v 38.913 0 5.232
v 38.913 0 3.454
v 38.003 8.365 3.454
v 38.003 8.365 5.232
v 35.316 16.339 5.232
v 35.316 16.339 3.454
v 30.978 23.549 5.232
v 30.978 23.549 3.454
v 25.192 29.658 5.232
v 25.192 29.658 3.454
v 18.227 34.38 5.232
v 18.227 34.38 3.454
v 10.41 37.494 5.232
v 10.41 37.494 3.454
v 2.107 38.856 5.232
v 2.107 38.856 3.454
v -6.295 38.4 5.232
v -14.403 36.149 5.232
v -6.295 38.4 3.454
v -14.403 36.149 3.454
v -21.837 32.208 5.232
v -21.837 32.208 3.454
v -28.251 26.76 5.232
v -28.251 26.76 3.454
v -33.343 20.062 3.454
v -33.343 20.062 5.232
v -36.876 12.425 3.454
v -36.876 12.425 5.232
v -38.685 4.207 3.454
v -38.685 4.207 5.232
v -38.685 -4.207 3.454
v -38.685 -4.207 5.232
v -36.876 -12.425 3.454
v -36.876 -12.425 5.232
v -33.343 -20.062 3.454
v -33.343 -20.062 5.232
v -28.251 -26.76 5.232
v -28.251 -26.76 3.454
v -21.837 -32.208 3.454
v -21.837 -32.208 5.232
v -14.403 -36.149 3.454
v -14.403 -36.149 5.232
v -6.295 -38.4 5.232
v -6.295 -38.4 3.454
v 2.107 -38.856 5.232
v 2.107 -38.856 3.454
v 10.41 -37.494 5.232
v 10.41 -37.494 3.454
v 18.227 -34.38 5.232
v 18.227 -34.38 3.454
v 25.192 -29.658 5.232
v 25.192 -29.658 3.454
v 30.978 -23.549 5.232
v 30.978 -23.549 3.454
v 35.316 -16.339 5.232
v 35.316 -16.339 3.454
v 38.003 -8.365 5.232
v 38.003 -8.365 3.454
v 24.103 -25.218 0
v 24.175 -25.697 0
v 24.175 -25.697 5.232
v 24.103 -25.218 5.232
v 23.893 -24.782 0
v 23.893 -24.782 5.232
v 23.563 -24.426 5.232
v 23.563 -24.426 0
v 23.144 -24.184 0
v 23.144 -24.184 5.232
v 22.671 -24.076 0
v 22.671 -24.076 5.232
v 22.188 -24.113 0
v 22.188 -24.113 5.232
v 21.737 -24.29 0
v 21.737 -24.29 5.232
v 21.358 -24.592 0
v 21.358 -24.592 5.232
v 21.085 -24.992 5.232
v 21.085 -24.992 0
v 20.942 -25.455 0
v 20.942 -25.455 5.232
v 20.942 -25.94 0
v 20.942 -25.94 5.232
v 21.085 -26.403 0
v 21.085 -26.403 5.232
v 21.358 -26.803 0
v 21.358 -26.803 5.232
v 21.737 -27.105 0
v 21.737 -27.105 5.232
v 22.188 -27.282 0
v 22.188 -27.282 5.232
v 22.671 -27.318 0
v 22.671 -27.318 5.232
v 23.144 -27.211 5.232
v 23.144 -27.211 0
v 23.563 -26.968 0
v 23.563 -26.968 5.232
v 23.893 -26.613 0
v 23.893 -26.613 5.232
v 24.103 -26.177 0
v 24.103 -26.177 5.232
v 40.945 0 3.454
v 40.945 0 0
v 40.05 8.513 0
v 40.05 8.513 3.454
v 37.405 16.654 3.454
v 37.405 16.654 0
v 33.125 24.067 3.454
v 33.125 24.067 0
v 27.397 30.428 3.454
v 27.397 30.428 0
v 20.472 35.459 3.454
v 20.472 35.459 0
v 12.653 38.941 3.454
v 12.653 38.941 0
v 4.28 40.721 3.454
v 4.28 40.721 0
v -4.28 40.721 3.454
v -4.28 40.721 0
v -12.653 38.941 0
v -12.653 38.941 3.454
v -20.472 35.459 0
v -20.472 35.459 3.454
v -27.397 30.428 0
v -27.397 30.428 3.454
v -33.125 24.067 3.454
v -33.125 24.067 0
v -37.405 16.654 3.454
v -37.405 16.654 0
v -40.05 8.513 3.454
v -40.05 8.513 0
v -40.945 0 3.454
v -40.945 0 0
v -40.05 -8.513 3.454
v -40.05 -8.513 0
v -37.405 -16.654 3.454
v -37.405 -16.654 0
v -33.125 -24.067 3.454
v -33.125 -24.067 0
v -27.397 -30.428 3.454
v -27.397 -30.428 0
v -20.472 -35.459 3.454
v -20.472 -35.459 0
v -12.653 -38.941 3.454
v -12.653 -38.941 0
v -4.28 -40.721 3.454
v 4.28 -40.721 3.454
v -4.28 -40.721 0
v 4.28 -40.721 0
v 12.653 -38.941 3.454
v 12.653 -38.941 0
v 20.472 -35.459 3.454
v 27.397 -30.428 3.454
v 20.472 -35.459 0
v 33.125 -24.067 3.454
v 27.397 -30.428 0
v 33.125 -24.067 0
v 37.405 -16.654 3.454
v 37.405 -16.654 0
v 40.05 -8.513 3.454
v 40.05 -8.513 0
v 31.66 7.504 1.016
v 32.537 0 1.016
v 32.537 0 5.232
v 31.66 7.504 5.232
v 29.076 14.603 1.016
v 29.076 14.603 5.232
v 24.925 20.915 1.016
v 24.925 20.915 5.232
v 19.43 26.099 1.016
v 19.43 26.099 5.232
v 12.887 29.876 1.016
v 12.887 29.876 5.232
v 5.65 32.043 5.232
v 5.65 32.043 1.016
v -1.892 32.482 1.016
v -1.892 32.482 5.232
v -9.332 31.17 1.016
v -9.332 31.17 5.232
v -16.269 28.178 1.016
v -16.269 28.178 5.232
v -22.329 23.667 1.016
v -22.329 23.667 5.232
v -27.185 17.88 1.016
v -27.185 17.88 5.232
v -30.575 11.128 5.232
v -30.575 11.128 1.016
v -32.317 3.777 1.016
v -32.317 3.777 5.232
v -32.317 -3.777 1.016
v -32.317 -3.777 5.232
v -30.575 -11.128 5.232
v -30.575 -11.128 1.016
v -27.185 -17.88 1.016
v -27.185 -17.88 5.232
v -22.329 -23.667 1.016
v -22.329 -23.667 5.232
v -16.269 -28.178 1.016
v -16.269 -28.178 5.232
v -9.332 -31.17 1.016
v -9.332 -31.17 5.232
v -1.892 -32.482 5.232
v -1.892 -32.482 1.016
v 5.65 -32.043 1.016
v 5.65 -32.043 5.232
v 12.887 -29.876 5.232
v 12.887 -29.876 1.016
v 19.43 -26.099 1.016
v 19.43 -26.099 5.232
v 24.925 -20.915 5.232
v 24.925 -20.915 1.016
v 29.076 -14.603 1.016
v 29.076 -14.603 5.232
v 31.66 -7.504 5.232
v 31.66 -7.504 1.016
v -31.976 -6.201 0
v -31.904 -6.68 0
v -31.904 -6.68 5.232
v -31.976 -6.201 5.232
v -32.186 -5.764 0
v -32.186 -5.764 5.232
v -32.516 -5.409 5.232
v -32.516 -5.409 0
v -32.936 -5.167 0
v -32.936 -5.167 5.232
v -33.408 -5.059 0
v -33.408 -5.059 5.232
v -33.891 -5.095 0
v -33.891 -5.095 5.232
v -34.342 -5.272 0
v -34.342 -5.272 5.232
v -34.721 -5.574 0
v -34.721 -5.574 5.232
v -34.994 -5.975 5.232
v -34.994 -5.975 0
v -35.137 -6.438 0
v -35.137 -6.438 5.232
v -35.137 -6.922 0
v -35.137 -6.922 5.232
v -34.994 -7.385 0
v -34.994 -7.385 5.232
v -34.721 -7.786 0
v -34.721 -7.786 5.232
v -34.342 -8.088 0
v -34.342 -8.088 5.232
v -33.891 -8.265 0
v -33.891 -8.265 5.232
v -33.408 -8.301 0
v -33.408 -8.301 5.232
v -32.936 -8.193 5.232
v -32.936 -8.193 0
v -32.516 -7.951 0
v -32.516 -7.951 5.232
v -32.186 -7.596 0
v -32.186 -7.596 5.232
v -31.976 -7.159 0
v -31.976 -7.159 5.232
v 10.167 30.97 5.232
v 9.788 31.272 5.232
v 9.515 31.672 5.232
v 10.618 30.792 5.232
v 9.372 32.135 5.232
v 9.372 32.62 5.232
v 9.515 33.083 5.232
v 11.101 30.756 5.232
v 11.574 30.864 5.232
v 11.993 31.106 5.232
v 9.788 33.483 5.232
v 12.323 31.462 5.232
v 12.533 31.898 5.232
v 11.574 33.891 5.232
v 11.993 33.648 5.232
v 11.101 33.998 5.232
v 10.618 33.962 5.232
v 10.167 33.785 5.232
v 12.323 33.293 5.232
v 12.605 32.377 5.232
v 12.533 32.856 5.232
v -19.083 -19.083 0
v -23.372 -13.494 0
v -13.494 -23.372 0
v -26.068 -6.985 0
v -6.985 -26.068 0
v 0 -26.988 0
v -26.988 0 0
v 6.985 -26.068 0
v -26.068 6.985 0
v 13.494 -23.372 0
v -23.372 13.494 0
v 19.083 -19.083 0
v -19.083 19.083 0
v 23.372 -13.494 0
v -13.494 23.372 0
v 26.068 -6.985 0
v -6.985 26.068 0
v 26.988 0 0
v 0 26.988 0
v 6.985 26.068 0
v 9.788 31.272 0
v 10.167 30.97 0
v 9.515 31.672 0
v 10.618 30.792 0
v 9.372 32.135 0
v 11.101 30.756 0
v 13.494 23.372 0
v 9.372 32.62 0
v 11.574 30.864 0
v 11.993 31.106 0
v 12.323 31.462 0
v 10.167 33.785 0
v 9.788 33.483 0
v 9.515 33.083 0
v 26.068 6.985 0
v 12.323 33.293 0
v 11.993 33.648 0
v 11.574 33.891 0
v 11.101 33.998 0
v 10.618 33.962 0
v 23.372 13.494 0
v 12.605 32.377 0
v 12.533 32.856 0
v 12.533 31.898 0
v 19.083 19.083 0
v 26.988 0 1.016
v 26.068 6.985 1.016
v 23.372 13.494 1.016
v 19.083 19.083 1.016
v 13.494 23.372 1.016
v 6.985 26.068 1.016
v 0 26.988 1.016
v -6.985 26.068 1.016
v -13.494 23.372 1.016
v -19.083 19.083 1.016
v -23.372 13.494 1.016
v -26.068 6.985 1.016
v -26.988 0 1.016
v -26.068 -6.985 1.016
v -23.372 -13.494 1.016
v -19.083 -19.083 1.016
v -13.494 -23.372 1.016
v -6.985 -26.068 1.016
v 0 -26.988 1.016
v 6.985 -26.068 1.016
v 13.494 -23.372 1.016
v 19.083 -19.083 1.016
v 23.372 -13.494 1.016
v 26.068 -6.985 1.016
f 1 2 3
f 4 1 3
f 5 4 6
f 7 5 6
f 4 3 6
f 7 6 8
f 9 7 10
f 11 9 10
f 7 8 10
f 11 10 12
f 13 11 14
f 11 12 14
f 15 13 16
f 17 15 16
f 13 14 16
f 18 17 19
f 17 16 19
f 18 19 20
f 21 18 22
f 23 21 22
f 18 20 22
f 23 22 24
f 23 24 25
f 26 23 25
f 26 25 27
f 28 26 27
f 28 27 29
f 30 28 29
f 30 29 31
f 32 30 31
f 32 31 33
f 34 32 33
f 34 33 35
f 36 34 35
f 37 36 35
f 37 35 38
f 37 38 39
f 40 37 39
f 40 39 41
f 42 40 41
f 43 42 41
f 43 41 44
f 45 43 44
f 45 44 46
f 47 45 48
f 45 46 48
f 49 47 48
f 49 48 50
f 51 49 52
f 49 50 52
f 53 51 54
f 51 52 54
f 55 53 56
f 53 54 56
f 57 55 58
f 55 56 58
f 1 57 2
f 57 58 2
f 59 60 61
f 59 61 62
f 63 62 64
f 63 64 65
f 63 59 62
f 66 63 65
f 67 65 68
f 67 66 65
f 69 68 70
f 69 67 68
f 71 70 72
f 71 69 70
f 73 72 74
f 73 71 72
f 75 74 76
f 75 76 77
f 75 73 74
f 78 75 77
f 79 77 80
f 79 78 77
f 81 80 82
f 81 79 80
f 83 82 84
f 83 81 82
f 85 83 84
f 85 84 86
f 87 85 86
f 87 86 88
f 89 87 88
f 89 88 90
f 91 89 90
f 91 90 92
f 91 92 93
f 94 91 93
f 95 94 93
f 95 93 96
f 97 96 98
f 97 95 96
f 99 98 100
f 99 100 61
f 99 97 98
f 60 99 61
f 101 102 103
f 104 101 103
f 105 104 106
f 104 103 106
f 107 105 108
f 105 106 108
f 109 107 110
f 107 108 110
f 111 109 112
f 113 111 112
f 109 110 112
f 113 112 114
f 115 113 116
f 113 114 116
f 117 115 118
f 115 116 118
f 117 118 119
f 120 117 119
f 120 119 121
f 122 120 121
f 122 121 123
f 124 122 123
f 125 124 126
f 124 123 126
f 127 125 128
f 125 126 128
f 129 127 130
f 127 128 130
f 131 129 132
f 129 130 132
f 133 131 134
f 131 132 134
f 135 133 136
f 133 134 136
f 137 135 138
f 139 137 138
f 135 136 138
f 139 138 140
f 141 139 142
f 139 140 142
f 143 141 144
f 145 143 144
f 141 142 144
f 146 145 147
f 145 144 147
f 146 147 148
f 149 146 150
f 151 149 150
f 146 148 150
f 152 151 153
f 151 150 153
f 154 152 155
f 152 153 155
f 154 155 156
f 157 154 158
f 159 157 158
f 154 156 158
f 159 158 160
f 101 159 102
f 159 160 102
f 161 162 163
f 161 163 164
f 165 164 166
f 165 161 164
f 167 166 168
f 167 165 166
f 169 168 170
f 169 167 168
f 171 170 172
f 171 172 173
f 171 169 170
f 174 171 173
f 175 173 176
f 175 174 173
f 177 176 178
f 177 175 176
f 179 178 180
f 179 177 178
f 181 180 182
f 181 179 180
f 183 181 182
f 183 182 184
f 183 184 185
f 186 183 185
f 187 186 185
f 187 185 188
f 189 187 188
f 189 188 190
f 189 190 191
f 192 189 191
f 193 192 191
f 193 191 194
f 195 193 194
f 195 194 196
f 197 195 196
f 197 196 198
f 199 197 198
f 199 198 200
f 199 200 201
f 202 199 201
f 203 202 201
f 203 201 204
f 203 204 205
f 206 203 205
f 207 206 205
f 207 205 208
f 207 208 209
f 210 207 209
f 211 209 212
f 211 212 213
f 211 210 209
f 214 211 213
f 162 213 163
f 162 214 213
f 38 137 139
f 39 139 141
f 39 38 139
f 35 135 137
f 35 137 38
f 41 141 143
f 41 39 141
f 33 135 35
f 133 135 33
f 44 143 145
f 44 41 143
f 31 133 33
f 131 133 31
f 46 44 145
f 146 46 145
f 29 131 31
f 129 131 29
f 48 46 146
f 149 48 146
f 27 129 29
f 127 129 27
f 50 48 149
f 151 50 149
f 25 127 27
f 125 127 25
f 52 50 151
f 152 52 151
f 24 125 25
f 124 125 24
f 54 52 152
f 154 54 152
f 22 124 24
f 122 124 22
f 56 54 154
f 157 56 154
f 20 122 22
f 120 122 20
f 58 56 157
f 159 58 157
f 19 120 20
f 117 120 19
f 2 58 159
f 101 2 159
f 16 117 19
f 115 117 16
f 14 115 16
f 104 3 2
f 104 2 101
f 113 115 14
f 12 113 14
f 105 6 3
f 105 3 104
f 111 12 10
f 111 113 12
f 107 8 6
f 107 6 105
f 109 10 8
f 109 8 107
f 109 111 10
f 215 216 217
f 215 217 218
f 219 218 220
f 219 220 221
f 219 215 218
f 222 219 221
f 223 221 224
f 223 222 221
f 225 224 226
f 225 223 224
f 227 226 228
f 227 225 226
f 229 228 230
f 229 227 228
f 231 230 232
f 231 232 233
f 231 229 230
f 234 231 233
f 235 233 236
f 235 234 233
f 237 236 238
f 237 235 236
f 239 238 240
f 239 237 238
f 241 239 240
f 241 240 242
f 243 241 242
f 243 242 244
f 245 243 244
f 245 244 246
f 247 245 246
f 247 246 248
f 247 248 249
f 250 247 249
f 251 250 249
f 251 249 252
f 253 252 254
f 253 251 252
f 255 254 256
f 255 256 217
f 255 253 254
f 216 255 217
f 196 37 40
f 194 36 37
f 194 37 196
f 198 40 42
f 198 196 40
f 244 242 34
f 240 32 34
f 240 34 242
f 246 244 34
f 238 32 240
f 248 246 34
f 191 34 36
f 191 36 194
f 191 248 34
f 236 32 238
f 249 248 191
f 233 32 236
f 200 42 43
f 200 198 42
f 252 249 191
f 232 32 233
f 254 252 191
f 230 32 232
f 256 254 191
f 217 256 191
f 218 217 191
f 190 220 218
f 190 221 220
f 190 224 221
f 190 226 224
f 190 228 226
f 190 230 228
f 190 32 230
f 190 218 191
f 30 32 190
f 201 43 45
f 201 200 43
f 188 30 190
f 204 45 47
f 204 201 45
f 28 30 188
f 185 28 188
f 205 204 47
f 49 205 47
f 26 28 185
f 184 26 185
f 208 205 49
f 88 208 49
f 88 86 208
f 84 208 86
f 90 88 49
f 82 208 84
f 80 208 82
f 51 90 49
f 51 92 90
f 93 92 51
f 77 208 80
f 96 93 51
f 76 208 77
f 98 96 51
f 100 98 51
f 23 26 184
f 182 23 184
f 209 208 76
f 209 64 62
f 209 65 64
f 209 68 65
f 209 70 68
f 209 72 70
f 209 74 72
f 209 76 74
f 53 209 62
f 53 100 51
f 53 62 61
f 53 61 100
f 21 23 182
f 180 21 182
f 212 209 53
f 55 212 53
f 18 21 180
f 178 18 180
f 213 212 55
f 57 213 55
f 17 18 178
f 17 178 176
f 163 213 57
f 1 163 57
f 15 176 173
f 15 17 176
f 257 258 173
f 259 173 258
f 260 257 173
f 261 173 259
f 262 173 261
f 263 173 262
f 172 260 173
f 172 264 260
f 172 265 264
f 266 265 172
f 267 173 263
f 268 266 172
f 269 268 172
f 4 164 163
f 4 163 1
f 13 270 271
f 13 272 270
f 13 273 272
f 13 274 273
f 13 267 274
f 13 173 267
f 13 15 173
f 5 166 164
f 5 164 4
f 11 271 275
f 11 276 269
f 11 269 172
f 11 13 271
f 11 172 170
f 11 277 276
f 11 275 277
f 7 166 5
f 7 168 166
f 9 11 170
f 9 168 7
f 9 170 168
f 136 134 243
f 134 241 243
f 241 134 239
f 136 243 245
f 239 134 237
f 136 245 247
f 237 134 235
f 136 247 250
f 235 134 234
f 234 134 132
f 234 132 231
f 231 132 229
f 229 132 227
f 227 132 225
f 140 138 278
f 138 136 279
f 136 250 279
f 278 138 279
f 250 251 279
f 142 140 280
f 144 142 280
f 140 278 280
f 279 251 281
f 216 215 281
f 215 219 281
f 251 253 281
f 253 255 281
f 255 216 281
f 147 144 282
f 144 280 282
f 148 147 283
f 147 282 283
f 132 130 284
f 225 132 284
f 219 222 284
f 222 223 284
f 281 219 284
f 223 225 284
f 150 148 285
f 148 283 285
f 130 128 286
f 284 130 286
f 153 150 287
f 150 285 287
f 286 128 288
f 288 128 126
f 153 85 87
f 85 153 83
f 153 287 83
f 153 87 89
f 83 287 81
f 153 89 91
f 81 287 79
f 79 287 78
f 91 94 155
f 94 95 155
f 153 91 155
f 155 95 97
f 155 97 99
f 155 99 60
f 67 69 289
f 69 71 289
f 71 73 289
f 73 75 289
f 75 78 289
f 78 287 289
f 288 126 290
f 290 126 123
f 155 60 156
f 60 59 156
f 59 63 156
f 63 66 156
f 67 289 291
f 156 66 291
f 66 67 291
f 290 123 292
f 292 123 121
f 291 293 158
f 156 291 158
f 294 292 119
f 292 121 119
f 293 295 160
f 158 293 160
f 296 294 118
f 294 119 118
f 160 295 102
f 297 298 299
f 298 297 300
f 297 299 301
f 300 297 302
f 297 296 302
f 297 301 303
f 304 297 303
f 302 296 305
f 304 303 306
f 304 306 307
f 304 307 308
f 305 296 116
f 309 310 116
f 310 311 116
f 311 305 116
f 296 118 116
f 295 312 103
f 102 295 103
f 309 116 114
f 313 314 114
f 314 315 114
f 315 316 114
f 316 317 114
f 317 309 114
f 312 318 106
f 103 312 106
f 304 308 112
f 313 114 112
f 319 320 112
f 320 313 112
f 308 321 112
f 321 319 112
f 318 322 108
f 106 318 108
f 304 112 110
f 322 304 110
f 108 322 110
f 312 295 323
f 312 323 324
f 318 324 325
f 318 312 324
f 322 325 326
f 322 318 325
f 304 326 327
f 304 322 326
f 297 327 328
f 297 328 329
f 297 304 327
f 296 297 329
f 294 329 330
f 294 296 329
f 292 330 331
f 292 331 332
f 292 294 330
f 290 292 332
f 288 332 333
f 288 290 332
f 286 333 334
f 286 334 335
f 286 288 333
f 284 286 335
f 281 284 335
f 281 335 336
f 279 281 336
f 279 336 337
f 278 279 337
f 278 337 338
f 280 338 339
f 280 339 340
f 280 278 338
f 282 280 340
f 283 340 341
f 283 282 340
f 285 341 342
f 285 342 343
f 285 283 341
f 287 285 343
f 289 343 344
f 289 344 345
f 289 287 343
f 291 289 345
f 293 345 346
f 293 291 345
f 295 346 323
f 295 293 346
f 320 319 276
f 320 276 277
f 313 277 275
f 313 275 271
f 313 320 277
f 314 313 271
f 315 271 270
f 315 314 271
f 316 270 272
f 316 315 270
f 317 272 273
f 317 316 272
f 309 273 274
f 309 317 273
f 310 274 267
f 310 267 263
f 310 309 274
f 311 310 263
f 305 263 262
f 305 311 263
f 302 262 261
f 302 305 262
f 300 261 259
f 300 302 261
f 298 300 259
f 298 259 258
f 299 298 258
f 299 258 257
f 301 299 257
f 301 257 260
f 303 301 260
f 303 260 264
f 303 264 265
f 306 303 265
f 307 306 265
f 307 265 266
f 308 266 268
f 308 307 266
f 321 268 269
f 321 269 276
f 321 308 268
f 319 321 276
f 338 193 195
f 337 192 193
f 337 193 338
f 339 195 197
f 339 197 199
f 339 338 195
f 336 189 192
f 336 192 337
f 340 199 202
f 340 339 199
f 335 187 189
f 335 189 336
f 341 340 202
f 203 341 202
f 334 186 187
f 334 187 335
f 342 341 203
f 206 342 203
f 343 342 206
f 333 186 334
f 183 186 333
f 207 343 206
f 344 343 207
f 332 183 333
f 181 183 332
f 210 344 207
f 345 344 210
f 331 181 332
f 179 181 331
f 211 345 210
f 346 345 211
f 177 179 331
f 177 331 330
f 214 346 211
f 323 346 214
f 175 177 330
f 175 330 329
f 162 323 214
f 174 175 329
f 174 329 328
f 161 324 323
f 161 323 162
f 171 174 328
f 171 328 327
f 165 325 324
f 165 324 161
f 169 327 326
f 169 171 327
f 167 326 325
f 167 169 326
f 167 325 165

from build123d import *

# Parameters (mm, degrees)
F0_R     = 38.9128
F0_R_2   = 1.6256
F0_R_3   = 32.5374
F1_DEPTH = 5.2324
F2_R     = 32.5374
F2_R_2   = 26.9875
F3_DEPTH = 1.016
F4_R     = 40.9448
F4_R_2   = 38.9128
F5_DEPTH = 3.4544


with BuildPart() as f1:
    # F0 (on Top) → F1 (new body)
    with BuildSketch(Plane.XY):
        Circle(F0_R)
        with Locations((-33.529478, -6.679878)):
            Circle(F0_R_2, mode=Mode.SUBTRACT)
        with Locations((22.549683, -25.697441)):
            Circle(F0_R_2, mode=Mode.SUBTRACT)
        Circle(F0_R_3, mode=Mode.SUBTRACT)
        with Locations((10.979795, 32.377319)):
            Circle(F0_R_2, mode=Mode.SUBTRACT)
    extrude(amount=F1_DEPTH)

    # F2 (on Top) → F3 (join)
    with BuildSketch(Plane.XY):
        Circle(F2_R)
        Circle(F2_R_2, mode=Mode.SUBTRACT)
    extrude(amount=F3_DEPTH)

    # F4 (on Top) → F5 (join)
    with BuildSketch(Plane.XY):
        Circle(F4_R)
        Circle(F4_R_2, mode=Mode.SUBTRACT)
    extrude(amount=F5_DEPTH)


solid = f1.part
